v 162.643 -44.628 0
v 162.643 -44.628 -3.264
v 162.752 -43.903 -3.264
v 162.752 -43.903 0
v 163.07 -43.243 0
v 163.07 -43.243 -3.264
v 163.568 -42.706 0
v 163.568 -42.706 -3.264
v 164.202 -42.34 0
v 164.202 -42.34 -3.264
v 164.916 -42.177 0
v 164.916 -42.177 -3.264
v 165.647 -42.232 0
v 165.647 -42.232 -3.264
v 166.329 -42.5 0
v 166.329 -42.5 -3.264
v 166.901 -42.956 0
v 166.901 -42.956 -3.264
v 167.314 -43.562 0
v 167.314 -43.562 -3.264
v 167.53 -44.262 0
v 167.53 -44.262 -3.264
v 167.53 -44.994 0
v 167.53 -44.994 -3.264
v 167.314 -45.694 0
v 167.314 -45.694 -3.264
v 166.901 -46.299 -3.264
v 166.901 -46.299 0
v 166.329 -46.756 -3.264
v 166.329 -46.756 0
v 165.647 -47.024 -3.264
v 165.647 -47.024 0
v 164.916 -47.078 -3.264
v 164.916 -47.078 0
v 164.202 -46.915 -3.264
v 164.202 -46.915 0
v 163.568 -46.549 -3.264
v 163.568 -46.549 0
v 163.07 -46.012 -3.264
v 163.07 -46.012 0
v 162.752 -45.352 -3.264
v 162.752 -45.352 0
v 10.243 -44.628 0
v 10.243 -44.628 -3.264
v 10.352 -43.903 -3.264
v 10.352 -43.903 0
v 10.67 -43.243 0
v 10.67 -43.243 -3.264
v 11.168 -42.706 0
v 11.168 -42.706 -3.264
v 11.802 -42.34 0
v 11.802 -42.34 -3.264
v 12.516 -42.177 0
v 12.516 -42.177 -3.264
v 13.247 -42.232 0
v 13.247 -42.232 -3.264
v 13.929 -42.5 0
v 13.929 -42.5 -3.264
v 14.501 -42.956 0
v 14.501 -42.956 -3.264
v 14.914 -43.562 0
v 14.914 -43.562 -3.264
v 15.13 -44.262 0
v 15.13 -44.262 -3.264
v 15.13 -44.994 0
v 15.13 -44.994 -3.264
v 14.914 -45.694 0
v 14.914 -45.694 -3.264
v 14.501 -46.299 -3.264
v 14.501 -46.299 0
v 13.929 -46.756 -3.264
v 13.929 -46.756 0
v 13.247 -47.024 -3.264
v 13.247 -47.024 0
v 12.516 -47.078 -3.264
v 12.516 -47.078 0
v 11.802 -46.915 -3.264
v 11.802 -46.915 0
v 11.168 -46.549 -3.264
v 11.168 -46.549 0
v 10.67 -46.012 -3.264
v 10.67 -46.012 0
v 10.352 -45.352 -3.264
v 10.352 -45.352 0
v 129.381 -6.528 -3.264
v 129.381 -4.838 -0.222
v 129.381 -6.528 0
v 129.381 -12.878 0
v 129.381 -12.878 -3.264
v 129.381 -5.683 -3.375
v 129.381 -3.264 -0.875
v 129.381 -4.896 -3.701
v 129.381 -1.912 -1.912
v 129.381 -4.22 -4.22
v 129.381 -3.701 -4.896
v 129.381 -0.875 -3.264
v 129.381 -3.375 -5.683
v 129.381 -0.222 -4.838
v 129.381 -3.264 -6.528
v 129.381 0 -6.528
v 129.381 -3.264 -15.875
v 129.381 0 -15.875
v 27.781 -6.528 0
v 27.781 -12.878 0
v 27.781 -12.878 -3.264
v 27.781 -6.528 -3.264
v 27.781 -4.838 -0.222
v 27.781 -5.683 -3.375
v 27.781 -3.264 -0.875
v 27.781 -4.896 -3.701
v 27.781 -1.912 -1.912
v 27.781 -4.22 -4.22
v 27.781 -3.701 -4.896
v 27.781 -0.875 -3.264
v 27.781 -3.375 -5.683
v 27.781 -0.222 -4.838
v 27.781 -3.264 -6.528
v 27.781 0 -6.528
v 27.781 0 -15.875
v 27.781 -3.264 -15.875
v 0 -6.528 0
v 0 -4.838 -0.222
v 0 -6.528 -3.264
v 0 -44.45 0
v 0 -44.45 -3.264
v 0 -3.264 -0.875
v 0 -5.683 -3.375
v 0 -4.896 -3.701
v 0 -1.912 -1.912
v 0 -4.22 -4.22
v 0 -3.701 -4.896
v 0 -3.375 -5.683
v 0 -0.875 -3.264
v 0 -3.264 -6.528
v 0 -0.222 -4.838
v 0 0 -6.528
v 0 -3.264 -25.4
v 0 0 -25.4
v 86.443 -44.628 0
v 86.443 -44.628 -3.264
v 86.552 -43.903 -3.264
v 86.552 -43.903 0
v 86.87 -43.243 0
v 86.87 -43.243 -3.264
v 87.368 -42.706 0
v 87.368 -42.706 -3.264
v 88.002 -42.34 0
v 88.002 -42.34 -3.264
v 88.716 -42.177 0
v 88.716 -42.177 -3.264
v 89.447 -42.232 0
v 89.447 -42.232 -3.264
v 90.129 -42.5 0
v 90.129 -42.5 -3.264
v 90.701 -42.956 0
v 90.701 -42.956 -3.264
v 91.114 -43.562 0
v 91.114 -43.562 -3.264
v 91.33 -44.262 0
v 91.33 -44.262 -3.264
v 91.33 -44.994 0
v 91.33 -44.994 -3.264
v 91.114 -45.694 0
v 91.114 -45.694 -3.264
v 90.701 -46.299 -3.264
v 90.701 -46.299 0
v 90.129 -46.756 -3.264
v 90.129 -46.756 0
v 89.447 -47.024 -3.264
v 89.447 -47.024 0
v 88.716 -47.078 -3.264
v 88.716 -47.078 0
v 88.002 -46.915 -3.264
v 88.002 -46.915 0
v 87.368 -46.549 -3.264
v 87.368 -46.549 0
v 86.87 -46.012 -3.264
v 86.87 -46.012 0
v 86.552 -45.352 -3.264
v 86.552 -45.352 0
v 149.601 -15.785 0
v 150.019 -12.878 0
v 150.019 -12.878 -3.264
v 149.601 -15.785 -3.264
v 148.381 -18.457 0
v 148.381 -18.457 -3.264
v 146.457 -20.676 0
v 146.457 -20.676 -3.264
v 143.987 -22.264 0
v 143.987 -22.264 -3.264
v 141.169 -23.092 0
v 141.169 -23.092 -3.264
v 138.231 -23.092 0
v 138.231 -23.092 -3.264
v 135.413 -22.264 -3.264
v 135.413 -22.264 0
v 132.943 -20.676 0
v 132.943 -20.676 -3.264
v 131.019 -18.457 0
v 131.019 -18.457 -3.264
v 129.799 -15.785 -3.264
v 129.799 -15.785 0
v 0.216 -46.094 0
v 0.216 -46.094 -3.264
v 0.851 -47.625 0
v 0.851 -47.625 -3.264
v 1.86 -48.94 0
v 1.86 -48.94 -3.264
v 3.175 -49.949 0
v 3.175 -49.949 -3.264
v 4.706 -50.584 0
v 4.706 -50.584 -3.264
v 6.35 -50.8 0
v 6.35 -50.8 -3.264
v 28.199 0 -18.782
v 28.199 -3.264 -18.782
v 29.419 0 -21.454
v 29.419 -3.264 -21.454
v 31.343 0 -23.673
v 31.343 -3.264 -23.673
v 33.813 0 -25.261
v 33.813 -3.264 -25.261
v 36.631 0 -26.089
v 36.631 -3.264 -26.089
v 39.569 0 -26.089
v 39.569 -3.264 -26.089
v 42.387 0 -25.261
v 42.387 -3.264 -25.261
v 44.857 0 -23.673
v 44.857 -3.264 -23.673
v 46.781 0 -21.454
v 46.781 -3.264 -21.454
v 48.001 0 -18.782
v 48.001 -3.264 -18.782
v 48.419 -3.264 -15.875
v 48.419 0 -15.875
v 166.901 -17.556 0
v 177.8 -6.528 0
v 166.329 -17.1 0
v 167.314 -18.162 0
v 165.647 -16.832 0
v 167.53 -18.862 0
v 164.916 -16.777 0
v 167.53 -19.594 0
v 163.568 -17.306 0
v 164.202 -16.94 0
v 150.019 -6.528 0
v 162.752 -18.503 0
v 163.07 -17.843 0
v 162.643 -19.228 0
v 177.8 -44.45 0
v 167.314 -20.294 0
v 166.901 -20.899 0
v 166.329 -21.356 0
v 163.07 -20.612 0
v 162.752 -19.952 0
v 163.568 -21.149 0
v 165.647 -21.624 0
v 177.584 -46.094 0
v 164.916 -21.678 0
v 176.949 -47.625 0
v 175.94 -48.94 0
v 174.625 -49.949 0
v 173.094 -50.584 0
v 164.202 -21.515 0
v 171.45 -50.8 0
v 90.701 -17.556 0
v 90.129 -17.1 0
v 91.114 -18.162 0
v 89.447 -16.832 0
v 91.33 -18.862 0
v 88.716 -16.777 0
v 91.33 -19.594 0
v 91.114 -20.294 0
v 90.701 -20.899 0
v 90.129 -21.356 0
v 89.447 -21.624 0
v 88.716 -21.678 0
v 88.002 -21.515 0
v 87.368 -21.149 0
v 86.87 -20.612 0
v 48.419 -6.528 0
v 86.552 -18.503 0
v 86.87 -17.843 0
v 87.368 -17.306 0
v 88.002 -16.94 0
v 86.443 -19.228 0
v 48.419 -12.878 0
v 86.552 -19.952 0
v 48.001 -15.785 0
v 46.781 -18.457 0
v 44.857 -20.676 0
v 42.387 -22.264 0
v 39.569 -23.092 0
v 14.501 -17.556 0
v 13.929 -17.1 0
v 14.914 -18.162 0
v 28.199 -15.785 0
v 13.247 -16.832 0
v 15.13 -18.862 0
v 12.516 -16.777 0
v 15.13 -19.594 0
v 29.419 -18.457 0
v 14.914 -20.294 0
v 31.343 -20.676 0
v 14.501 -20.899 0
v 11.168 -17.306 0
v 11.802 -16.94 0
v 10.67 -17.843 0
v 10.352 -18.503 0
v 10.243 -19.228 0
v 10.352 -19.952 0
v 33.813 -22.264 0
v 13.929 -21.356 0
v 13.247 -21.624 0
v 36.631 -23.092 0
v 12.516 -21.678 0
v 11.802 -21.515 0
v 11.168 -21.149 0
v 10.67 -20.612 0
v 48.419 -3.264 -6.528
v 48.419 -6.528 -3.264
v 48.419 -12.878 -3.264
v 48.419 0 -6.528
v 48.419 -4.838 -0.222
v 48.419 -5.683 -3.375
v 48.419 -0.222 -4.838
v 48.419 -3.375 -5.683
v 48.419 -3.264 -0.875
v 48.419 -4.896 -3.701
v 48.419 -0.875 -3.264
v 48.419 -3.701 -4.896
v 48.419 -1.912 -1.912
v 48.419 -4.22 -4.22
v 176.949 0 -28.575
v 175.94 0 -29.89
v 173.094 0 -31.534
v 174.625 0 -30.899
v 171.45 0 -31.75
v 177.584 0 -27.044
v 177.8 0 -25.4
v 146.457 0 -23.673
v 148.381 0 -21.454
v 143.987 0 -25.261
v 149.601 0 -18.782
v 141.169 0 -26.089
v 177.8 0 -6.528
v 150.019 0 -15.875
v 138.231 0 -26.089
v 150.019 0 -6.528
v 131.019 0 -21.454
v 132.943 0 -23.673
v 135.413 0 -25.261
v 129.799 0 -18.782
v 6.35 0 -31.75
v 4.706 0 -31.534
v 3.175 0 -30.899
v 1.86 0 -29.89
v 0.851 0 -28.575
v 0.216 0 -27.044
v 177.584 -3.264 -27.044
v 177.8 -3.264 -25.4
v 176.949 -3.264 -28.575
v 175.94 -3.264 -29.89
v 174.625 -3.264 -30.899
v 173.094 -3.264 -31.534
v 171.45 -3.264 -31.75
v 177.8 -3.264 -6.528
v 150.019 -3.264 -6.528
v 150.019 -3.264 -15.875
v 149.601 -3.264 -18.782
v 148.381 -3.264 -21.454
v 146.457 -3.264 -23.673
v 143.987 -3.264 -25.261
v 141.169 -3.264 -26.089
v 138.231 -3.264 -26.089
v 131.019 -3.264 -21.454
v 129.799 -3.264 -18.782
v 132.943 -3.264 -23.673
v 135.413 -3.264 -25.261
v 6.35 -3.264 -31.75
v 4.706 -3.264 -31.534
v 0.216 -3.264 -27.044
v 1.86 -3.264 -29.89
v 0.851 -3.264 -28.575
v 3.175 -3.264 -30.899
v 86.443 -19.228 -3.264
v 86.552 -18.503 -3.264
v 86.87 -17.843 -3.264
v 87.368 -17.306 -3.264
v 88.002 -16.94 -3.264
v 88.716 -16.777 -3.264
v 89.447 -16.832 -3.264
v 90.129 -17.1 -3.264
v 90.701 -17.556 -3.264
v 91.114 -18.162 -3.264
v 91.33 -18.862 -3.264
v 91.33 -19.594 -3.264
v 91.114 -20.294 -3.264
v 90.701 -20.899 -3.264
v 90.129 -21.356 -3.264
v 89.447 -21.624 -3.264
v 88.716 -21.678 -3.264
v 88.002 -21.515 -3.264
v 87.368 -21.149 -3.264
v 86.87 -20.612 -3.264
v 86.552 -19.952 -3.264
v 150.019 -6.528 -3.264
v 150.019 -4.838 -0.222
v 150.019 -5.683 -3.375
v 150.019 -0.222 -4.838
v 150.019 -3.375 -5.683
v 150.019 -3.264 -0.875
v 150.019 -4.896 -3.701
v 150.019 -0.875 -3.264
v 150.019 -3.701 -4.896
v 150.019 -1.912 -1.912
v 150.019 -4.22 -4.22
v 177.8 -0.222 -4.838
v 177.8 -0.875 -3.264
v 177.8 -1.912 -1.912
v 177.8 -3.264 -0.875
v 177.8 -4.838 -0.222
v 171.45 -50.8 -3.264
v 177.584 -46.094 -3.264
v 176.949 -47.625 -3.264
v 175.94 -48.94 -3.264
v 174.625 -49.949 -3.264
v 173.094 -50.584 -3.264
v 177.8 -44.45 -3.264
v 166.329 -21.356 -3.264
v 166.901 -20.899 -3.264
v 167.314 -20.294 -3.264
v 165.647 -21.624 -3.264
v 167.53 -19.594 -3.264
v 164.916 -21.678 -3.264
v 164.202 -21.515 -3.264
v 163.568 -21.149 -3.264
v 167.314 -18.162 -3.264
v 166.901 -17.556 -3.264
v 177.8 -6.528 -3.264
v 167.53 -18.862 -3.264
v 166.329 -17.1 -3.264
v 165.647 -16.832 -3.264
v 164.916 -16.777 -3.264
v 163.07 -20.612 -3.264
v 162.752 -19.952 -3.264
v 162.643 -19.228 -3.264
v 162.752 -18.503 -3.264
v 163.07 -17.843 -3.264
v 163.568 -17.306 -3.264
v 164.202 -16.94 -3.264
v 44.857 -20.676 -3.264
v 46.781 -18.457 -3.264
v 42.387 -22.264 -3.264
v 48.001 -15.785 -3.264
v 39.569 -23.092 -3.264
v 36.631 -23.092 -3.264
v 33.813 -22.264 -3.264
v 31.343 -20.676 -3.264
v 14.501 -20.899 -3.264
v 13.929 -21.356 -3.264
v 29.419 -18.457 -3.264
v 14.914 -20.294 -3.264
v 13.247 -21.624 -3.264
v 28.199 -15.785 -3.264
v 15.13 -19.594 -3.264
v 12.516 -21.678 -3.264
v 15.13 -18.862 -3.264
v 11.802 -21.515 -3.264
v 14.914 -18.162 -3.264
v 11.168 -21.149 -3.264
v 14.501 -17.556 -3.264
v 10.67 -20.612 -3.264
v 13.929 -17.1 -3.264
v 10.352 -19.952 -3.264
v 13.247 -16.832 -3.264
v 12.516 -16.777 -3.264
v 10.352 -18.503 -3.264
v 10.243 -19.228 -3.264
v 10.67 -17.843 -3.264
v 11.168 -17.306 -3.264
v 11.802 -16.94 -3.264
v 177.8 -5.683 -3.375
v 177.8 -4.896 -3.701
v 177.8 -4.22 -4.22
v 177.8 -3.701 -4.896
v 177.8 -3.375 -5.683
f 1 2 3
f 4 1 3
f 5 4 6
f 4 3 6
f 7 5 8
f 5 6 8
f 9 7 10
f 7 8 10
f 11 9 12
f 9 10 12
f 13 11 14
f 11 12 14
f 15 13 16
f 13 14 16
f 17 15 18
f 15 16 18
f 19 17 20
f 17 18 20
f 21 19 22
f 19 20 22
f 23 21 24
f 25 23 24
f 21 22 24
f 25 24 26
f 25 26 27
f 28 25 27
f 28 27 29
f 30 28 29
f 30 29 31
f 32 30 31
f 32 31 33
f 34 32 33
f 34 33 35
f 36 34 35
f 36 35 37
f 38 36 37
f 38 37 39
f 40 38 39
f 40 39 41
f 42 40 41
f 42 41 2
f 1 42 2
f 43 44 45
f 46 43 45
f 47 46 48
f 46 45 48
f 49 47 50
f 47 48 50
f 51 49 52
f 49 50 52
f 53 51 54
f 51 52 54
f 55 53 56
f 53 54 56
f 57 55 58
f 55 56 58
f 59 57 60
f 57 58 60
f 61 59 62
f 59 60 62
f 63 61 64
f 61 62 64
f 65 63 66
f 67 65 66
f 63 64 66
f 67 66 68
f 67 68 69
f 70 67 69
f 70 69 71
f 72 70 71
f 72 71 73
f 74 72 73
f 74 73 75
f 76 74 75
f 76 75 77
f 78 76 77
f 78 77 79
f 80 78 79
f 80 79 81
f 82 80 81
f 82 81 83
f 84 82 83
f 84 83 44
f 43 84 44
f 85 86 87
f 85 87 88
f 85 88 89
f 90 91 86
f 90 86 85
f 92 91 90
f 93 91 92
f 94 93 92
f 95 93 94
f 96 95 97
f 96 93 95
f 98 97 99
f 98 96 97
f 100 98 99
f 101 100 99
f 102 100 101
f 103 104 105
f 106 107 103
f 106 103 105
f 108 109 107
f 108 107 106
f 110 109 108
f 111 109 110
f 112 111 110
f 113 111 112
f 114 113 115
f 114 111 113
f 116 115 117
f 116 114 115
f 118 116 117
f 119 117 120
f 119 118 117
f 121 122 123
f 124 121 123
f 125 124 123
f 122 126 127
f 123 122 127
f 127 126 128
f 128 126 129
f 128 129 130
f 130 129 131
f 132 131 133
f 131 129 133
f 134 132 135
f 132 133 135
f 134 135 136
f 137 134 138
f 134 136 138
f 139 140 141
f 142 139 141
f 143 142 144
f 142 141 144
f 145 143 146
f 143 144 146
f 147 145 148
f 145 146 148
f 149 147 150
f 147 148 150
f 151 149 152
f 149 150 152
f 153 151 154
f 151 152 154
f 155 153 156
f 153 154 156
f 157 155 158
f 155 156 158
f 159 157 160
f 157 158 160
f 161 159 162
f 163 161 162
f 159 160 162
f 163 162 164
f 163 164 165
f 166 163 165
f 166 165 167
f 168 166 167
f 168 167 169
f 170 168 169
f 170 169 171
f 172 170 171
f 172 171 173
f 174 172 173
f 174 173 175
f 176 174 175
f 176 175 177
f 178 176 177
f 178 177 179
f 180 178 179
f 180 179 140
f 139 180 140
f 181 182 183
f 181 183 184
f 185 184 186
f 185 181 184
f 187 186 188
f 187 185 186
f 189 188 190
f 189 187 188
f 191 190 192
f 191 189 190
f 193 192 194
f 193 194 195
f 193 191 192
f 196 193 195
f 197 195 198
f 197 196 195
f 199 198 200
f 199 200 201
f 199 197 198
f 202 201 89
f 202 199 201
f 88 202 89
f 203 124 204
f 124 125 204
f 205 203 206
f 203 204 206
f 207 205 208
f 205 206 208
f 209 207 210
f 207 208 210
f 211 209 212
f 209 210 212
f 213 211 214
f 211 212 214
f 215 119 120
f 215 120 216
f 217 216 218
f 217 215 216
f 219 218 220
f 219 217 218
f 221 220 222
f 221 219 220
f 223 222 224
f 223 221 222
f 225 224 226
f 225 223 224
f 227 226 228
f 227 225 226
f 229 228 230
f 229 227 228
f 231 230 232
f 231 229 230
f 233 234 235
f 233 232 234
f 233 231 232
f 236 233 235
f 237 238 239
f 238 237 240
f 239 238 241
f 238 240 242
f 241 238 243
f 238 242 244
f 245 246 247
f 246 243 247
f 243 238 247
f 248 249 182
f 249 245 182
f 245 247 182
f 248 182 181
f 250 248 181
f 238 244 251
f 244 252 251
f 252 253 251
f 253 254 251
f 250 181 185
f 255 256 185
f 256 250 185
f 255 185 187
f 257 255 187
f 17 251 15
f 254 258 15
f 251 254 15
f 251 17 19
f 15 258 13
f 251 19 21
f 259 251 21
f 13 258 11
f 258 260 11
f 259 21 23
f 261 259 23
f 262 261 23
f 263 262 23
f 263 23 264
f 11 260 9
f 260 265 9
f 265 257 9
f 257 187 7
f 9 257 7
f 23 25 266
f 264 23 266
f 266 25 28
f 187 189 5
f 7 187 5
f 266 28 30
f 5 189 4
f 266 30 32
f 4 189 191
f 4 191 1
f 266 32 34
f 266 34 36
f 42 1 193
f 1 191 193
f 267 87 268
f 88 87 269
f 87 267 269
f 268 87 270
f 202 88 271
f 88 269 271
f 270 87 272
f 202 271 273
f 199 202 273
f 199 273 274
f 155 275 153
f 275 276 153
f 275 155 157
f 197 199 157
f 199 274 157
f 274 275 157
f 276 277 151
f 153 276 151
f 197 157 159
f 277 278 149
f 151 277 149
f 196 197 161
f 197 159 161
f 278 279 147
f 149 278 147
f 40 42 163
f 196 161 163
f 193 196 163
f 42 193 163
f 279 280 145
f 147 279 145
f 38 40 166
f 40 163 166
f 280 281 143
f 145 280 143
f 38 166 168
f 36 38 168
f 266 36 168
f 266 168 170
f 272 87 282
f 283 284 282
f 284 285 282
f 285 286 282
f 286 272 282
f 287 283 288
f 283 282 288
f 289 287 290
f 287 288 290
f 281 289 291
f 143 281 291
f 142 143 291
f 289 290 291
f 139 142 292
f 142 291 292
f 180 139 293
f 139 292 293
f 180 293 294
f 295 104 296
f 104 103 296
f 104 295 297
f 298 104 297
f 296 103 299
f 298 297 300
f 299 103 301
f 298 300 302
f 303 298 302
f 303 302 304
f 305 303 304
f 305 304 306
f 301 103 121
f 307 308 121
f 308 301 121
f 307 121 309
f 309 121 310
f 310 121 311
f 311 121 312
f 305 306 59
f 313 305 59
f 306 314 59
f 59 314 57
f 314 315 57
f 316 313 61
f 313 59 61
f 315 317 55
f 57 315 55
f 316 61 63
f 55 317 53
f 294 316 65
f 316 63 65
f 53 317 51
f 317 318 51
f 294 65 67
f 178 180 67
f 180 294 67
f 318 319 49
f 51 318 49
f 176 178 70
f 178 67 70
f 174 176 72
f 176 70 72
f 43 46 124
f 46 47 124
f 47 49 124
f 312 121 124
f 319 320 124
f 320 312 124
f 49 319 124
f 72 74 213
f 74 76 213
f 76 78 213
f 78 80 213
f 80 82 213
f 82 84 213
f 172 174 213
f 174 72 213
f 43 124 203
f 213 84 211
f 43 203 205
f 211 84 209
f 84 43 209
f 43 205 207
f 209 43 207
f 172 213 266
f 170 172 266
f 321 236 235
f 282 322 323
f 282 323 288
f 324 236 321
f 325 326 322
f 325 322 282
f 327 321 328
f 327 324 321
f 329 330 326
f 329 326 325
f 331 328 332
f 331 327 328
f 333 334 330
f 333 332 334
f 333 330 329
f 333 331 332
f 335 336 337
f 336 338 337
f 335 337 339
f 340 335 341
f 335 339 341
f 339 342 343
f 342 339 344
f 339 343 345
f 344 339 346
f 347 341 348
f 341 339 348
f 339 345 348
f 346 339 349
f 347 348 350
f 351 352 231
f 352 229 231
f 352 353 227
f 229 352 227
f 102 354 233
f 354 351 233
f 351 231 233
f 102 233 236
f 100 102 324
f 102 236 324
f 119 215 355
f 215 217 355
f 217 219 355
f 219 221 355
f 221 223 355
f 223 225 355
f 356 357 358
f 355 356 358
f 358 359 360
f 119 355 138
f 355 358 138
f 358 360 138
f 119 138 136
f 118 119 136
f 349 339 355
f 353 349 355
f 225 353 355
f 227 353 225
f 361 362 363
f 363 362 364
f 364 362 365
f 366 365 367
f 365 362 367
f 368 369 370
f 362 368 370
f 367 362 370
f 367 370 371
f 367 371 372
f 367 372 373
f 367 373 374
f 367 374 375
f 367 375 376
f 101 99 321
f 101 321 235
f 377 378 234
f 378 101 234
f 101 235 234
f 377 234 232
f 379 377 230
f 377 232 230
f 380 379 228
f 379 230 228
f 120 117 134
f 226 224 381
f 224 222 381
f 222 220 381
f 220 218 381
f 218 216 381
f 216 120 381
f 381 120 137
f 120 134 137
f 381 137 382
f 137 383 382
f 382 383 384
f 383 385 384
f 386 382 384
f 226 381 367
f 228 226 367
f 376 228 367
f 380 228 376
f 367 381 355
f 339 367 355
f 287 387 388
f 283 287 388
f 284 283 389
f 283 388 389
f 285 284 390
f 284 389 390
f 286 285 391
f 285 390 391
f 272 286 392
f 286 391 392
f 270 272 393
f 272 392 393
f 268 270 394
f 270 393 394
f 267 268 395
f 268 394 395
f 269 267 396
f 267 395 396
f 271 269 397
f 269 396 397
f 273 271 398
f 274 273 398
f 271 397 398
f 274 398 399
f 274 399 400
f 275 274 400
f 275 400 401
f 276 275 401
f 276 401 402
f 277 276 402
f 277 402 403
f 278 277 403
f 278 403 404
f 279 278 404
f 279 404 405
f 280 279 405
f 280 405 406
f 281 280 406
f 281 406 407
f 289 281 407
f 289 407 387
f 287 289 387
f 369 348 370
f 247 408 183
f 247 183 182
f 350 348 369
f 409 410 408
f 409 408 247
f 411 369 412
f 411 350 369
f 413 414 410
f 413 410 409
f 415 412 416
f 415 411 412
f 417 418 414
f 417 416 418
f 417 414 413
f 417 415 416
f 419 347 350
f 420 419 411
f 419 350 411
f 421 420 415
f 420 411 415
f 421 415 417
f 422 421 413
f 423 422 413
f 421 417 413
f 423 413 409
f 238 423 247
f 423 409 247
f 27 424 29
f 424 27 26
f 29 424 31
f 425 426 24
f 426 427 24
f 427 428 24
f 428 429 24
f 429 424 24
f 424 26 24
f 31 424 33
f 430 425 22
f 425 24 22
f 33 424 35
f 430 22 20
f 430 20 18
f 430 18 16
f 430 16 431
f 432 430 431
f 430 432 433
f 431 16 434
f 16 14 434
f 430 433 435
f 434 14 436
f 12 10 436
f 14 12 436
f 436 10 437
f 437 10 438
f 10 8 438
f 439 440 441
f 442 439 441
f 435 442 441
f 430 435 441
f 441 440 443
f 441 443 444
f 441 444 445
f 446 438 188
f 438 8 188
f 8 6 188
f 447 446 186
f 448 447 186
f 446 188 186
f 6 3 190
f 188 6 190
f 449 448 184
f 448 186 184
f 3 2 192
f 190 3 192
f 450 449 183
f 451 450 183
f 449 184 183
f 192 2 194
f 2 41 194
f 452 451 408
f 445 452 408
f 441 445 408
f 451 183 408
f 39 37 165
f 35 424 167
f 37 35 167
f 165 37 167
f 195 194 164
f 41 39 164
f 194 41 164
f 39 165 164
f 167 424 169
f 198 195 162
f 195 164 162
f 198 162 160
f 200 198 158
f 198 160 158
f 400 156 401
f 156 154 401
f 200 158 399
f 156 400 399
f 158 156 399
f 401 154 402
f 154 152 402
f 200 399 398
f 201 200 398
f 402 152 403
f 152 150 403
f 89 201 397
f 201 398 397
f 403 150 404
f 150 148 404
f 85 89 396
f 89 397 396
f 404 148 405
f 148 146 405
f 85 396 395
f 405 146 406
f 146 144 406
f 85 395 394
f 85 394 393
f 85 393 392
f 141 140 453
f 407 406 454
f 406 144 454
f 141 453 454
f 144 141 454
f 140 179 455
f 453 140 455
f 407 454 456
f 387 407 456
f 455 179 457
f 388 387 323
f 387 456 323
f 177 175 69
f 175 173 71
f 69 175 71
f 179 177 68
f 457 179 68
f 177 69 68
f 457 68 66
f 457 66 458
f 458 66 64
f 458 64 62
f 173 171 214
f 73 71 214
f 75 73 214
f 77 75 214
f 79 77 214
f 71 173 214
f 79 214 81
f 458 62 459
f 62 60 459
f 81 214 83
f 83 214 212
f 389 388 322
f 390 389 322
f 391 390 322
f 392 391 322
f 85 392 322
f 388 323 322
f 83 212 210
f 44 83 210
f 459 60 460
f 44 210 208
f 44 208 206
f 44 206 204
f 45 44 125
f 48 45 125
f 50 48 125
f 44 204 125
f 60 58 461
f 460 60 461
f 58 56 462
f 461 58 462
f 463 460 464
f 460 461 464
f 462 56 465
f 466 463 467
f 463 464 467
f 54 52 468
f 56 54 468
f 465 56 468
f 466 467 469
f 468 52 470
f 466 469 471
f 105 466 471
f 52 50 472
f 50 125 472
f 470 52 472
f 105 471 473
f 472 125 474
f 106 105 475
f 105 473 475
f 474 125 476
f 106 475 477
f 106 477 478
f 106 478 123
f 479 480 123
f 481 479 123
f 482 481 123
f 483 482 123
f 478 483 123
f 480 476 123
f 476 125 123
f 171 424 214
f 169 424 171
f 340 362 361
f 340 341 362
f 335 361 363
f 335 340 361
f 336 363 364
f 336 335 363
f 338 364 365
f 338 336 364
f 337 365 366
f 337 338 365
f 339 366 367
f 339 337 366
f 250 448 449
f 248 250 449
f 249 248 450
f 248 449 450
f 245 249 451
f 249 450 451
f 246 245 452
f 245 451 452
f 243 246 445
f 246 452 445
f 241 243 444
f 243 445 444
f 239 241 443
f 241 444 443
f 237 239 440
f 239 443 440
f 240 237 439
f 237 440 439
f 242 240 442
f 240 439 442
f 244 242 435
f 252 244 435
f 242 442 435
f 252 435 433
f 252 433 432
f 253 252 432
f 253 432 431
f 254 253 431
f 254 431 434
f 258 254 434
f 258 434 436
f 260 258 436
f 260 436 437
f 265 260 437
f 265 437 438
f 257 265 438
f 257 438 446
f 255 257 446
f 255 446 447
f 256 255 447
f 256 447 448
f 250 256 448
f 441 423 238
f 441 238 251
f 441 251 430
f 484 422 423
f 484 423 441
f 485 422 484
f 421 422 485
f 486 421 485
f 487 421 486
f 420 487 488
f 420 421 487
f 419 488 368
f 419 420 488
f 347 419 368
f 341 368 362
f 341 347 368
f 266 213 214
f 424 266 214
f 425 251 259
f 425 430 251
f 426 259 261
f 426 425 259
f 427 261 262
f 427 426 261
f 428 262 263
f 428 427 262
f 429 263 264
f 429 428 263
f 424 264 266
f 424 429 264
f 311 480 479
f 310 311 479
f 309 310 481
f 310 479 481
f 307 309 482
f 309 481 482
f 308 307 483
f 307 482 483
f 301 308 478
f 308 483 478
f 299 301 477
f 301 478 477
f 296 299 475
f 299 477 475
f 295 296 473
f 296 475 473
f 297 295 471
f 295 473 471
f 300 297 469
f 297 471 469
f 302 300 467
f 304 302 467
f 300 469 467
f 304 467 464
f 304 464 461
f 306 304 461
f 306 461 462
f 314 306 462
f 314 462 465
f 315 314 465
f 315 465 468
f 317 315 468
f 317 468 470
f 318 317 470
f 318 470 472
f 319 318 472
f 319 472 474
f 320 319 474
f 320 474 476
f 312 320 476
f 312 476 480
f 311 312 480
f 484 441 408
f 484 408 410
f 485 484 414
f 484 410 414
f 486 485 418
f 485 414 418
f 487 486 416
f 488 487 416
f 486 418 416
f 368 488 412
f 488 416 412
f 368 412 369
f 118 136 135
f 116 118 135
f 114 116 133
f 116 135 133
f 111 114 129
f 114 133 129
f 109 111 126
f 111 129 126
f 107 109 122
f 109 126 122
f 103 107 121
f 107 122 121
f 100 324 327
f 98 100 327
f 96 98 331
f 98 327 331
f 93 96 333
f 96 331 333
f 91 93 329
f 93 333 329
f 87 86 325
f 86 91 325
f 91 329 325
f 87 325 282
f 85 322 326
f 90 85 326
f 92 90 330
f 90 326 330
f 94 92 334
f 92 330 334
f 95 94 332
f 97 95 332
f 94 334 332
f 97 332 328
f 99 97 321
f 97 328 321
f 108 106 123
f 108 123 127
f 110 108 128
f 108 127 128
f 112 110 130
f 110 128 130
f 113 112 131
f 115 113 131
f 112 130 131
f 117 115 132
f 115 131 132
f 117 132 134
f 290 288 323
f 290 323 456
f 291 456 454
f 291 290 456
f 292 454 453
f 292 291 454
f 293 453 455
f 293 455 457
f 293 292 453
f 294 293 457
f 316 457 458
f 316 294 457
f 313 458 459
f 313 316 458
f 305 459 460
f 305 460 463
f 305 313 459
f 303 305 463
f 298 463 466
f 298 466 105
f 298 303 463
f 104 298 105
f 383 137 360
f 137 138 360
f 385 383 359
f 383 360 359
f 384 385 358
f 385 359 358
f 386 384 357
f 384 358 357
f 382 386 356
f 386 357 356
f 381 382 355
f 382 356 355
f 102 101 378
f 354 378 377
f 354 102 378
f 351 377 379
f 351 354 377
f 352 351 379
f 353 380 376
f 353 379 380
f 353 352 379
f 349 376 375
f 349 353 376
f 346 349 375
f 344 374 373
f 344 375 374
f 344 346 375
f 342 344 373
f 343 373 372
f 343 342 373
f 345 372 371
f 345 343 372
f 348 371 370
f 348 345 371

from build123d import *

# Parameters (mm, degrees)
BASE_FLANGE1_DEPTH           = 177.8
CUT_EXTRUDE1_DEPTH           = 6.5278
F_10_0_1935_DIAMETER_HOLE1_D = 4.9149
FILLET1_R                    = 6.35
CUT_EXTRUDE2_DEPTH           = 3.2639


# Sheet-metal steps are written as plain solids
with BuildPart() as part:
    # Sketch1 → Base-Flange1 (new body)
    with BuildSketch(Plane(origin=(0, 0, 0), x_dir=(0, 0, -1), z_dir=(1, 0, 0))):
        with BuildLine():
            Line((31.75, 0), (6.5278, 0))
            ThreePointArc((6.5278, 0), (1.911948354, -1.911948354), (0, -6.5278))
            Line((0, -6.5278), (0, -50.8))
            Line((0, -50.8), (3.2639, -50.8))
            Line((3.2639, -50.8), (3.2639, -6.5278))
            ThreePointArc((3.2639, -6.5278), (4.219874177, -4.219874177), (6.5278, -3.2639))
            Line((6.5278, -3.2639), (31.75, -3.2639))
            Line((31.75, -3.2639), (31.75, 0))
        make_face()
    extrude(amount=BASE_FLANGE1_DEPTH)

    # Sketch6 → Cut-Extrude1 (cut)
    with BuildSketch(Plane(origin=(0, 0, 0), x_dir=(1, 0, 0), z_dir=(0, 1, 0))):
        with BuildLine():
            Line((27.78125, 0), (27.78125, 15.875))
            ThreePointArc((27.78125, 15.875), (38.1, 26.19375), (48.41875, 15.875))
            Line((48.41875, 15.875), (48.41875, 0))
            ThreePointArc((48.41875, 0), (38.1, -10.31875), (27.78125, 0))
        make_face()
        with BuildLine():
            Line((129.38125, 0), (129.38125, 15.875))
            ThreePointArc((129.38125, 15.875), (139.7, 26.19375), (150.01875, 15.875))
            Line((150.01875, 15.875), (150.01875, 0))
            ThreePointArc((150.01875, 0), (139.7, -10.31875), (129.38125, 0))
        make_face()
    extrude(amount=-CUT_EXTRUDE1_DEPTH, mode=Mode.SUBTRACT)

    # #10 (0.1935) Diameter Hole1 (through all)
    with Locations(Plane.XY):
        with Locations((12.7, -19.2278), (88.9, -19.2278), (165.1, -19.2278), (88.9, -44.6278), (165.1, -44.6278), (12.7, -44.6278)):
            Hole(F_10_0_1935_DIAMETER_HOLE1_D / 2)

    # Fillet1
    fillet1_edges = [part.edges().sort_by_distance(p)[0] for p in [
        (177.8, -50.8, -1.63195),
        (0, -50.8, -1.63195),
        (177.8, -1.63195, -31.75),
        (0, -1.63195, -31.75),
    ]]
    fillet(fillet1_edges, radius=FILLET1_R)

    # Sketch9 → Cut-Extrude2 (cut)
    with BuildSketch(Plane.XY):
        with BuildLine():
            Line((48.41875, -6.5278), (48.41875, -12.8778))
            ThreePointArc((48.41875, -12.8778), (38.1, -23.19655), (27.78125, -12.8778))
            Line((27.78125, -12.8778), (27.78125, -6.5278))
            ThreePointArc((27.78125, -6.5278), (38.1, 3.79095), (48.41875, -6.5278))
        make_face()
        with BuildLine():
            Line((150.01875, -6.5278), (150.01875, -12.8778))
            ThreePointArc((150.01875, -12.8778), (139.7, -23.19655), (129.38125, -12.8778))
            Line((129.38125, -12.8778), (129.38125, -6.5278))
            ThreePointArc((129.38125, -6.5278), (139.7, 3.79095), (150.01875, -6.5278))
        make_face()
    extrude(amount=-CUT_EXTRUDE2_DEPTH, mode=Mode.SUBTRACT)


solid = part.part
